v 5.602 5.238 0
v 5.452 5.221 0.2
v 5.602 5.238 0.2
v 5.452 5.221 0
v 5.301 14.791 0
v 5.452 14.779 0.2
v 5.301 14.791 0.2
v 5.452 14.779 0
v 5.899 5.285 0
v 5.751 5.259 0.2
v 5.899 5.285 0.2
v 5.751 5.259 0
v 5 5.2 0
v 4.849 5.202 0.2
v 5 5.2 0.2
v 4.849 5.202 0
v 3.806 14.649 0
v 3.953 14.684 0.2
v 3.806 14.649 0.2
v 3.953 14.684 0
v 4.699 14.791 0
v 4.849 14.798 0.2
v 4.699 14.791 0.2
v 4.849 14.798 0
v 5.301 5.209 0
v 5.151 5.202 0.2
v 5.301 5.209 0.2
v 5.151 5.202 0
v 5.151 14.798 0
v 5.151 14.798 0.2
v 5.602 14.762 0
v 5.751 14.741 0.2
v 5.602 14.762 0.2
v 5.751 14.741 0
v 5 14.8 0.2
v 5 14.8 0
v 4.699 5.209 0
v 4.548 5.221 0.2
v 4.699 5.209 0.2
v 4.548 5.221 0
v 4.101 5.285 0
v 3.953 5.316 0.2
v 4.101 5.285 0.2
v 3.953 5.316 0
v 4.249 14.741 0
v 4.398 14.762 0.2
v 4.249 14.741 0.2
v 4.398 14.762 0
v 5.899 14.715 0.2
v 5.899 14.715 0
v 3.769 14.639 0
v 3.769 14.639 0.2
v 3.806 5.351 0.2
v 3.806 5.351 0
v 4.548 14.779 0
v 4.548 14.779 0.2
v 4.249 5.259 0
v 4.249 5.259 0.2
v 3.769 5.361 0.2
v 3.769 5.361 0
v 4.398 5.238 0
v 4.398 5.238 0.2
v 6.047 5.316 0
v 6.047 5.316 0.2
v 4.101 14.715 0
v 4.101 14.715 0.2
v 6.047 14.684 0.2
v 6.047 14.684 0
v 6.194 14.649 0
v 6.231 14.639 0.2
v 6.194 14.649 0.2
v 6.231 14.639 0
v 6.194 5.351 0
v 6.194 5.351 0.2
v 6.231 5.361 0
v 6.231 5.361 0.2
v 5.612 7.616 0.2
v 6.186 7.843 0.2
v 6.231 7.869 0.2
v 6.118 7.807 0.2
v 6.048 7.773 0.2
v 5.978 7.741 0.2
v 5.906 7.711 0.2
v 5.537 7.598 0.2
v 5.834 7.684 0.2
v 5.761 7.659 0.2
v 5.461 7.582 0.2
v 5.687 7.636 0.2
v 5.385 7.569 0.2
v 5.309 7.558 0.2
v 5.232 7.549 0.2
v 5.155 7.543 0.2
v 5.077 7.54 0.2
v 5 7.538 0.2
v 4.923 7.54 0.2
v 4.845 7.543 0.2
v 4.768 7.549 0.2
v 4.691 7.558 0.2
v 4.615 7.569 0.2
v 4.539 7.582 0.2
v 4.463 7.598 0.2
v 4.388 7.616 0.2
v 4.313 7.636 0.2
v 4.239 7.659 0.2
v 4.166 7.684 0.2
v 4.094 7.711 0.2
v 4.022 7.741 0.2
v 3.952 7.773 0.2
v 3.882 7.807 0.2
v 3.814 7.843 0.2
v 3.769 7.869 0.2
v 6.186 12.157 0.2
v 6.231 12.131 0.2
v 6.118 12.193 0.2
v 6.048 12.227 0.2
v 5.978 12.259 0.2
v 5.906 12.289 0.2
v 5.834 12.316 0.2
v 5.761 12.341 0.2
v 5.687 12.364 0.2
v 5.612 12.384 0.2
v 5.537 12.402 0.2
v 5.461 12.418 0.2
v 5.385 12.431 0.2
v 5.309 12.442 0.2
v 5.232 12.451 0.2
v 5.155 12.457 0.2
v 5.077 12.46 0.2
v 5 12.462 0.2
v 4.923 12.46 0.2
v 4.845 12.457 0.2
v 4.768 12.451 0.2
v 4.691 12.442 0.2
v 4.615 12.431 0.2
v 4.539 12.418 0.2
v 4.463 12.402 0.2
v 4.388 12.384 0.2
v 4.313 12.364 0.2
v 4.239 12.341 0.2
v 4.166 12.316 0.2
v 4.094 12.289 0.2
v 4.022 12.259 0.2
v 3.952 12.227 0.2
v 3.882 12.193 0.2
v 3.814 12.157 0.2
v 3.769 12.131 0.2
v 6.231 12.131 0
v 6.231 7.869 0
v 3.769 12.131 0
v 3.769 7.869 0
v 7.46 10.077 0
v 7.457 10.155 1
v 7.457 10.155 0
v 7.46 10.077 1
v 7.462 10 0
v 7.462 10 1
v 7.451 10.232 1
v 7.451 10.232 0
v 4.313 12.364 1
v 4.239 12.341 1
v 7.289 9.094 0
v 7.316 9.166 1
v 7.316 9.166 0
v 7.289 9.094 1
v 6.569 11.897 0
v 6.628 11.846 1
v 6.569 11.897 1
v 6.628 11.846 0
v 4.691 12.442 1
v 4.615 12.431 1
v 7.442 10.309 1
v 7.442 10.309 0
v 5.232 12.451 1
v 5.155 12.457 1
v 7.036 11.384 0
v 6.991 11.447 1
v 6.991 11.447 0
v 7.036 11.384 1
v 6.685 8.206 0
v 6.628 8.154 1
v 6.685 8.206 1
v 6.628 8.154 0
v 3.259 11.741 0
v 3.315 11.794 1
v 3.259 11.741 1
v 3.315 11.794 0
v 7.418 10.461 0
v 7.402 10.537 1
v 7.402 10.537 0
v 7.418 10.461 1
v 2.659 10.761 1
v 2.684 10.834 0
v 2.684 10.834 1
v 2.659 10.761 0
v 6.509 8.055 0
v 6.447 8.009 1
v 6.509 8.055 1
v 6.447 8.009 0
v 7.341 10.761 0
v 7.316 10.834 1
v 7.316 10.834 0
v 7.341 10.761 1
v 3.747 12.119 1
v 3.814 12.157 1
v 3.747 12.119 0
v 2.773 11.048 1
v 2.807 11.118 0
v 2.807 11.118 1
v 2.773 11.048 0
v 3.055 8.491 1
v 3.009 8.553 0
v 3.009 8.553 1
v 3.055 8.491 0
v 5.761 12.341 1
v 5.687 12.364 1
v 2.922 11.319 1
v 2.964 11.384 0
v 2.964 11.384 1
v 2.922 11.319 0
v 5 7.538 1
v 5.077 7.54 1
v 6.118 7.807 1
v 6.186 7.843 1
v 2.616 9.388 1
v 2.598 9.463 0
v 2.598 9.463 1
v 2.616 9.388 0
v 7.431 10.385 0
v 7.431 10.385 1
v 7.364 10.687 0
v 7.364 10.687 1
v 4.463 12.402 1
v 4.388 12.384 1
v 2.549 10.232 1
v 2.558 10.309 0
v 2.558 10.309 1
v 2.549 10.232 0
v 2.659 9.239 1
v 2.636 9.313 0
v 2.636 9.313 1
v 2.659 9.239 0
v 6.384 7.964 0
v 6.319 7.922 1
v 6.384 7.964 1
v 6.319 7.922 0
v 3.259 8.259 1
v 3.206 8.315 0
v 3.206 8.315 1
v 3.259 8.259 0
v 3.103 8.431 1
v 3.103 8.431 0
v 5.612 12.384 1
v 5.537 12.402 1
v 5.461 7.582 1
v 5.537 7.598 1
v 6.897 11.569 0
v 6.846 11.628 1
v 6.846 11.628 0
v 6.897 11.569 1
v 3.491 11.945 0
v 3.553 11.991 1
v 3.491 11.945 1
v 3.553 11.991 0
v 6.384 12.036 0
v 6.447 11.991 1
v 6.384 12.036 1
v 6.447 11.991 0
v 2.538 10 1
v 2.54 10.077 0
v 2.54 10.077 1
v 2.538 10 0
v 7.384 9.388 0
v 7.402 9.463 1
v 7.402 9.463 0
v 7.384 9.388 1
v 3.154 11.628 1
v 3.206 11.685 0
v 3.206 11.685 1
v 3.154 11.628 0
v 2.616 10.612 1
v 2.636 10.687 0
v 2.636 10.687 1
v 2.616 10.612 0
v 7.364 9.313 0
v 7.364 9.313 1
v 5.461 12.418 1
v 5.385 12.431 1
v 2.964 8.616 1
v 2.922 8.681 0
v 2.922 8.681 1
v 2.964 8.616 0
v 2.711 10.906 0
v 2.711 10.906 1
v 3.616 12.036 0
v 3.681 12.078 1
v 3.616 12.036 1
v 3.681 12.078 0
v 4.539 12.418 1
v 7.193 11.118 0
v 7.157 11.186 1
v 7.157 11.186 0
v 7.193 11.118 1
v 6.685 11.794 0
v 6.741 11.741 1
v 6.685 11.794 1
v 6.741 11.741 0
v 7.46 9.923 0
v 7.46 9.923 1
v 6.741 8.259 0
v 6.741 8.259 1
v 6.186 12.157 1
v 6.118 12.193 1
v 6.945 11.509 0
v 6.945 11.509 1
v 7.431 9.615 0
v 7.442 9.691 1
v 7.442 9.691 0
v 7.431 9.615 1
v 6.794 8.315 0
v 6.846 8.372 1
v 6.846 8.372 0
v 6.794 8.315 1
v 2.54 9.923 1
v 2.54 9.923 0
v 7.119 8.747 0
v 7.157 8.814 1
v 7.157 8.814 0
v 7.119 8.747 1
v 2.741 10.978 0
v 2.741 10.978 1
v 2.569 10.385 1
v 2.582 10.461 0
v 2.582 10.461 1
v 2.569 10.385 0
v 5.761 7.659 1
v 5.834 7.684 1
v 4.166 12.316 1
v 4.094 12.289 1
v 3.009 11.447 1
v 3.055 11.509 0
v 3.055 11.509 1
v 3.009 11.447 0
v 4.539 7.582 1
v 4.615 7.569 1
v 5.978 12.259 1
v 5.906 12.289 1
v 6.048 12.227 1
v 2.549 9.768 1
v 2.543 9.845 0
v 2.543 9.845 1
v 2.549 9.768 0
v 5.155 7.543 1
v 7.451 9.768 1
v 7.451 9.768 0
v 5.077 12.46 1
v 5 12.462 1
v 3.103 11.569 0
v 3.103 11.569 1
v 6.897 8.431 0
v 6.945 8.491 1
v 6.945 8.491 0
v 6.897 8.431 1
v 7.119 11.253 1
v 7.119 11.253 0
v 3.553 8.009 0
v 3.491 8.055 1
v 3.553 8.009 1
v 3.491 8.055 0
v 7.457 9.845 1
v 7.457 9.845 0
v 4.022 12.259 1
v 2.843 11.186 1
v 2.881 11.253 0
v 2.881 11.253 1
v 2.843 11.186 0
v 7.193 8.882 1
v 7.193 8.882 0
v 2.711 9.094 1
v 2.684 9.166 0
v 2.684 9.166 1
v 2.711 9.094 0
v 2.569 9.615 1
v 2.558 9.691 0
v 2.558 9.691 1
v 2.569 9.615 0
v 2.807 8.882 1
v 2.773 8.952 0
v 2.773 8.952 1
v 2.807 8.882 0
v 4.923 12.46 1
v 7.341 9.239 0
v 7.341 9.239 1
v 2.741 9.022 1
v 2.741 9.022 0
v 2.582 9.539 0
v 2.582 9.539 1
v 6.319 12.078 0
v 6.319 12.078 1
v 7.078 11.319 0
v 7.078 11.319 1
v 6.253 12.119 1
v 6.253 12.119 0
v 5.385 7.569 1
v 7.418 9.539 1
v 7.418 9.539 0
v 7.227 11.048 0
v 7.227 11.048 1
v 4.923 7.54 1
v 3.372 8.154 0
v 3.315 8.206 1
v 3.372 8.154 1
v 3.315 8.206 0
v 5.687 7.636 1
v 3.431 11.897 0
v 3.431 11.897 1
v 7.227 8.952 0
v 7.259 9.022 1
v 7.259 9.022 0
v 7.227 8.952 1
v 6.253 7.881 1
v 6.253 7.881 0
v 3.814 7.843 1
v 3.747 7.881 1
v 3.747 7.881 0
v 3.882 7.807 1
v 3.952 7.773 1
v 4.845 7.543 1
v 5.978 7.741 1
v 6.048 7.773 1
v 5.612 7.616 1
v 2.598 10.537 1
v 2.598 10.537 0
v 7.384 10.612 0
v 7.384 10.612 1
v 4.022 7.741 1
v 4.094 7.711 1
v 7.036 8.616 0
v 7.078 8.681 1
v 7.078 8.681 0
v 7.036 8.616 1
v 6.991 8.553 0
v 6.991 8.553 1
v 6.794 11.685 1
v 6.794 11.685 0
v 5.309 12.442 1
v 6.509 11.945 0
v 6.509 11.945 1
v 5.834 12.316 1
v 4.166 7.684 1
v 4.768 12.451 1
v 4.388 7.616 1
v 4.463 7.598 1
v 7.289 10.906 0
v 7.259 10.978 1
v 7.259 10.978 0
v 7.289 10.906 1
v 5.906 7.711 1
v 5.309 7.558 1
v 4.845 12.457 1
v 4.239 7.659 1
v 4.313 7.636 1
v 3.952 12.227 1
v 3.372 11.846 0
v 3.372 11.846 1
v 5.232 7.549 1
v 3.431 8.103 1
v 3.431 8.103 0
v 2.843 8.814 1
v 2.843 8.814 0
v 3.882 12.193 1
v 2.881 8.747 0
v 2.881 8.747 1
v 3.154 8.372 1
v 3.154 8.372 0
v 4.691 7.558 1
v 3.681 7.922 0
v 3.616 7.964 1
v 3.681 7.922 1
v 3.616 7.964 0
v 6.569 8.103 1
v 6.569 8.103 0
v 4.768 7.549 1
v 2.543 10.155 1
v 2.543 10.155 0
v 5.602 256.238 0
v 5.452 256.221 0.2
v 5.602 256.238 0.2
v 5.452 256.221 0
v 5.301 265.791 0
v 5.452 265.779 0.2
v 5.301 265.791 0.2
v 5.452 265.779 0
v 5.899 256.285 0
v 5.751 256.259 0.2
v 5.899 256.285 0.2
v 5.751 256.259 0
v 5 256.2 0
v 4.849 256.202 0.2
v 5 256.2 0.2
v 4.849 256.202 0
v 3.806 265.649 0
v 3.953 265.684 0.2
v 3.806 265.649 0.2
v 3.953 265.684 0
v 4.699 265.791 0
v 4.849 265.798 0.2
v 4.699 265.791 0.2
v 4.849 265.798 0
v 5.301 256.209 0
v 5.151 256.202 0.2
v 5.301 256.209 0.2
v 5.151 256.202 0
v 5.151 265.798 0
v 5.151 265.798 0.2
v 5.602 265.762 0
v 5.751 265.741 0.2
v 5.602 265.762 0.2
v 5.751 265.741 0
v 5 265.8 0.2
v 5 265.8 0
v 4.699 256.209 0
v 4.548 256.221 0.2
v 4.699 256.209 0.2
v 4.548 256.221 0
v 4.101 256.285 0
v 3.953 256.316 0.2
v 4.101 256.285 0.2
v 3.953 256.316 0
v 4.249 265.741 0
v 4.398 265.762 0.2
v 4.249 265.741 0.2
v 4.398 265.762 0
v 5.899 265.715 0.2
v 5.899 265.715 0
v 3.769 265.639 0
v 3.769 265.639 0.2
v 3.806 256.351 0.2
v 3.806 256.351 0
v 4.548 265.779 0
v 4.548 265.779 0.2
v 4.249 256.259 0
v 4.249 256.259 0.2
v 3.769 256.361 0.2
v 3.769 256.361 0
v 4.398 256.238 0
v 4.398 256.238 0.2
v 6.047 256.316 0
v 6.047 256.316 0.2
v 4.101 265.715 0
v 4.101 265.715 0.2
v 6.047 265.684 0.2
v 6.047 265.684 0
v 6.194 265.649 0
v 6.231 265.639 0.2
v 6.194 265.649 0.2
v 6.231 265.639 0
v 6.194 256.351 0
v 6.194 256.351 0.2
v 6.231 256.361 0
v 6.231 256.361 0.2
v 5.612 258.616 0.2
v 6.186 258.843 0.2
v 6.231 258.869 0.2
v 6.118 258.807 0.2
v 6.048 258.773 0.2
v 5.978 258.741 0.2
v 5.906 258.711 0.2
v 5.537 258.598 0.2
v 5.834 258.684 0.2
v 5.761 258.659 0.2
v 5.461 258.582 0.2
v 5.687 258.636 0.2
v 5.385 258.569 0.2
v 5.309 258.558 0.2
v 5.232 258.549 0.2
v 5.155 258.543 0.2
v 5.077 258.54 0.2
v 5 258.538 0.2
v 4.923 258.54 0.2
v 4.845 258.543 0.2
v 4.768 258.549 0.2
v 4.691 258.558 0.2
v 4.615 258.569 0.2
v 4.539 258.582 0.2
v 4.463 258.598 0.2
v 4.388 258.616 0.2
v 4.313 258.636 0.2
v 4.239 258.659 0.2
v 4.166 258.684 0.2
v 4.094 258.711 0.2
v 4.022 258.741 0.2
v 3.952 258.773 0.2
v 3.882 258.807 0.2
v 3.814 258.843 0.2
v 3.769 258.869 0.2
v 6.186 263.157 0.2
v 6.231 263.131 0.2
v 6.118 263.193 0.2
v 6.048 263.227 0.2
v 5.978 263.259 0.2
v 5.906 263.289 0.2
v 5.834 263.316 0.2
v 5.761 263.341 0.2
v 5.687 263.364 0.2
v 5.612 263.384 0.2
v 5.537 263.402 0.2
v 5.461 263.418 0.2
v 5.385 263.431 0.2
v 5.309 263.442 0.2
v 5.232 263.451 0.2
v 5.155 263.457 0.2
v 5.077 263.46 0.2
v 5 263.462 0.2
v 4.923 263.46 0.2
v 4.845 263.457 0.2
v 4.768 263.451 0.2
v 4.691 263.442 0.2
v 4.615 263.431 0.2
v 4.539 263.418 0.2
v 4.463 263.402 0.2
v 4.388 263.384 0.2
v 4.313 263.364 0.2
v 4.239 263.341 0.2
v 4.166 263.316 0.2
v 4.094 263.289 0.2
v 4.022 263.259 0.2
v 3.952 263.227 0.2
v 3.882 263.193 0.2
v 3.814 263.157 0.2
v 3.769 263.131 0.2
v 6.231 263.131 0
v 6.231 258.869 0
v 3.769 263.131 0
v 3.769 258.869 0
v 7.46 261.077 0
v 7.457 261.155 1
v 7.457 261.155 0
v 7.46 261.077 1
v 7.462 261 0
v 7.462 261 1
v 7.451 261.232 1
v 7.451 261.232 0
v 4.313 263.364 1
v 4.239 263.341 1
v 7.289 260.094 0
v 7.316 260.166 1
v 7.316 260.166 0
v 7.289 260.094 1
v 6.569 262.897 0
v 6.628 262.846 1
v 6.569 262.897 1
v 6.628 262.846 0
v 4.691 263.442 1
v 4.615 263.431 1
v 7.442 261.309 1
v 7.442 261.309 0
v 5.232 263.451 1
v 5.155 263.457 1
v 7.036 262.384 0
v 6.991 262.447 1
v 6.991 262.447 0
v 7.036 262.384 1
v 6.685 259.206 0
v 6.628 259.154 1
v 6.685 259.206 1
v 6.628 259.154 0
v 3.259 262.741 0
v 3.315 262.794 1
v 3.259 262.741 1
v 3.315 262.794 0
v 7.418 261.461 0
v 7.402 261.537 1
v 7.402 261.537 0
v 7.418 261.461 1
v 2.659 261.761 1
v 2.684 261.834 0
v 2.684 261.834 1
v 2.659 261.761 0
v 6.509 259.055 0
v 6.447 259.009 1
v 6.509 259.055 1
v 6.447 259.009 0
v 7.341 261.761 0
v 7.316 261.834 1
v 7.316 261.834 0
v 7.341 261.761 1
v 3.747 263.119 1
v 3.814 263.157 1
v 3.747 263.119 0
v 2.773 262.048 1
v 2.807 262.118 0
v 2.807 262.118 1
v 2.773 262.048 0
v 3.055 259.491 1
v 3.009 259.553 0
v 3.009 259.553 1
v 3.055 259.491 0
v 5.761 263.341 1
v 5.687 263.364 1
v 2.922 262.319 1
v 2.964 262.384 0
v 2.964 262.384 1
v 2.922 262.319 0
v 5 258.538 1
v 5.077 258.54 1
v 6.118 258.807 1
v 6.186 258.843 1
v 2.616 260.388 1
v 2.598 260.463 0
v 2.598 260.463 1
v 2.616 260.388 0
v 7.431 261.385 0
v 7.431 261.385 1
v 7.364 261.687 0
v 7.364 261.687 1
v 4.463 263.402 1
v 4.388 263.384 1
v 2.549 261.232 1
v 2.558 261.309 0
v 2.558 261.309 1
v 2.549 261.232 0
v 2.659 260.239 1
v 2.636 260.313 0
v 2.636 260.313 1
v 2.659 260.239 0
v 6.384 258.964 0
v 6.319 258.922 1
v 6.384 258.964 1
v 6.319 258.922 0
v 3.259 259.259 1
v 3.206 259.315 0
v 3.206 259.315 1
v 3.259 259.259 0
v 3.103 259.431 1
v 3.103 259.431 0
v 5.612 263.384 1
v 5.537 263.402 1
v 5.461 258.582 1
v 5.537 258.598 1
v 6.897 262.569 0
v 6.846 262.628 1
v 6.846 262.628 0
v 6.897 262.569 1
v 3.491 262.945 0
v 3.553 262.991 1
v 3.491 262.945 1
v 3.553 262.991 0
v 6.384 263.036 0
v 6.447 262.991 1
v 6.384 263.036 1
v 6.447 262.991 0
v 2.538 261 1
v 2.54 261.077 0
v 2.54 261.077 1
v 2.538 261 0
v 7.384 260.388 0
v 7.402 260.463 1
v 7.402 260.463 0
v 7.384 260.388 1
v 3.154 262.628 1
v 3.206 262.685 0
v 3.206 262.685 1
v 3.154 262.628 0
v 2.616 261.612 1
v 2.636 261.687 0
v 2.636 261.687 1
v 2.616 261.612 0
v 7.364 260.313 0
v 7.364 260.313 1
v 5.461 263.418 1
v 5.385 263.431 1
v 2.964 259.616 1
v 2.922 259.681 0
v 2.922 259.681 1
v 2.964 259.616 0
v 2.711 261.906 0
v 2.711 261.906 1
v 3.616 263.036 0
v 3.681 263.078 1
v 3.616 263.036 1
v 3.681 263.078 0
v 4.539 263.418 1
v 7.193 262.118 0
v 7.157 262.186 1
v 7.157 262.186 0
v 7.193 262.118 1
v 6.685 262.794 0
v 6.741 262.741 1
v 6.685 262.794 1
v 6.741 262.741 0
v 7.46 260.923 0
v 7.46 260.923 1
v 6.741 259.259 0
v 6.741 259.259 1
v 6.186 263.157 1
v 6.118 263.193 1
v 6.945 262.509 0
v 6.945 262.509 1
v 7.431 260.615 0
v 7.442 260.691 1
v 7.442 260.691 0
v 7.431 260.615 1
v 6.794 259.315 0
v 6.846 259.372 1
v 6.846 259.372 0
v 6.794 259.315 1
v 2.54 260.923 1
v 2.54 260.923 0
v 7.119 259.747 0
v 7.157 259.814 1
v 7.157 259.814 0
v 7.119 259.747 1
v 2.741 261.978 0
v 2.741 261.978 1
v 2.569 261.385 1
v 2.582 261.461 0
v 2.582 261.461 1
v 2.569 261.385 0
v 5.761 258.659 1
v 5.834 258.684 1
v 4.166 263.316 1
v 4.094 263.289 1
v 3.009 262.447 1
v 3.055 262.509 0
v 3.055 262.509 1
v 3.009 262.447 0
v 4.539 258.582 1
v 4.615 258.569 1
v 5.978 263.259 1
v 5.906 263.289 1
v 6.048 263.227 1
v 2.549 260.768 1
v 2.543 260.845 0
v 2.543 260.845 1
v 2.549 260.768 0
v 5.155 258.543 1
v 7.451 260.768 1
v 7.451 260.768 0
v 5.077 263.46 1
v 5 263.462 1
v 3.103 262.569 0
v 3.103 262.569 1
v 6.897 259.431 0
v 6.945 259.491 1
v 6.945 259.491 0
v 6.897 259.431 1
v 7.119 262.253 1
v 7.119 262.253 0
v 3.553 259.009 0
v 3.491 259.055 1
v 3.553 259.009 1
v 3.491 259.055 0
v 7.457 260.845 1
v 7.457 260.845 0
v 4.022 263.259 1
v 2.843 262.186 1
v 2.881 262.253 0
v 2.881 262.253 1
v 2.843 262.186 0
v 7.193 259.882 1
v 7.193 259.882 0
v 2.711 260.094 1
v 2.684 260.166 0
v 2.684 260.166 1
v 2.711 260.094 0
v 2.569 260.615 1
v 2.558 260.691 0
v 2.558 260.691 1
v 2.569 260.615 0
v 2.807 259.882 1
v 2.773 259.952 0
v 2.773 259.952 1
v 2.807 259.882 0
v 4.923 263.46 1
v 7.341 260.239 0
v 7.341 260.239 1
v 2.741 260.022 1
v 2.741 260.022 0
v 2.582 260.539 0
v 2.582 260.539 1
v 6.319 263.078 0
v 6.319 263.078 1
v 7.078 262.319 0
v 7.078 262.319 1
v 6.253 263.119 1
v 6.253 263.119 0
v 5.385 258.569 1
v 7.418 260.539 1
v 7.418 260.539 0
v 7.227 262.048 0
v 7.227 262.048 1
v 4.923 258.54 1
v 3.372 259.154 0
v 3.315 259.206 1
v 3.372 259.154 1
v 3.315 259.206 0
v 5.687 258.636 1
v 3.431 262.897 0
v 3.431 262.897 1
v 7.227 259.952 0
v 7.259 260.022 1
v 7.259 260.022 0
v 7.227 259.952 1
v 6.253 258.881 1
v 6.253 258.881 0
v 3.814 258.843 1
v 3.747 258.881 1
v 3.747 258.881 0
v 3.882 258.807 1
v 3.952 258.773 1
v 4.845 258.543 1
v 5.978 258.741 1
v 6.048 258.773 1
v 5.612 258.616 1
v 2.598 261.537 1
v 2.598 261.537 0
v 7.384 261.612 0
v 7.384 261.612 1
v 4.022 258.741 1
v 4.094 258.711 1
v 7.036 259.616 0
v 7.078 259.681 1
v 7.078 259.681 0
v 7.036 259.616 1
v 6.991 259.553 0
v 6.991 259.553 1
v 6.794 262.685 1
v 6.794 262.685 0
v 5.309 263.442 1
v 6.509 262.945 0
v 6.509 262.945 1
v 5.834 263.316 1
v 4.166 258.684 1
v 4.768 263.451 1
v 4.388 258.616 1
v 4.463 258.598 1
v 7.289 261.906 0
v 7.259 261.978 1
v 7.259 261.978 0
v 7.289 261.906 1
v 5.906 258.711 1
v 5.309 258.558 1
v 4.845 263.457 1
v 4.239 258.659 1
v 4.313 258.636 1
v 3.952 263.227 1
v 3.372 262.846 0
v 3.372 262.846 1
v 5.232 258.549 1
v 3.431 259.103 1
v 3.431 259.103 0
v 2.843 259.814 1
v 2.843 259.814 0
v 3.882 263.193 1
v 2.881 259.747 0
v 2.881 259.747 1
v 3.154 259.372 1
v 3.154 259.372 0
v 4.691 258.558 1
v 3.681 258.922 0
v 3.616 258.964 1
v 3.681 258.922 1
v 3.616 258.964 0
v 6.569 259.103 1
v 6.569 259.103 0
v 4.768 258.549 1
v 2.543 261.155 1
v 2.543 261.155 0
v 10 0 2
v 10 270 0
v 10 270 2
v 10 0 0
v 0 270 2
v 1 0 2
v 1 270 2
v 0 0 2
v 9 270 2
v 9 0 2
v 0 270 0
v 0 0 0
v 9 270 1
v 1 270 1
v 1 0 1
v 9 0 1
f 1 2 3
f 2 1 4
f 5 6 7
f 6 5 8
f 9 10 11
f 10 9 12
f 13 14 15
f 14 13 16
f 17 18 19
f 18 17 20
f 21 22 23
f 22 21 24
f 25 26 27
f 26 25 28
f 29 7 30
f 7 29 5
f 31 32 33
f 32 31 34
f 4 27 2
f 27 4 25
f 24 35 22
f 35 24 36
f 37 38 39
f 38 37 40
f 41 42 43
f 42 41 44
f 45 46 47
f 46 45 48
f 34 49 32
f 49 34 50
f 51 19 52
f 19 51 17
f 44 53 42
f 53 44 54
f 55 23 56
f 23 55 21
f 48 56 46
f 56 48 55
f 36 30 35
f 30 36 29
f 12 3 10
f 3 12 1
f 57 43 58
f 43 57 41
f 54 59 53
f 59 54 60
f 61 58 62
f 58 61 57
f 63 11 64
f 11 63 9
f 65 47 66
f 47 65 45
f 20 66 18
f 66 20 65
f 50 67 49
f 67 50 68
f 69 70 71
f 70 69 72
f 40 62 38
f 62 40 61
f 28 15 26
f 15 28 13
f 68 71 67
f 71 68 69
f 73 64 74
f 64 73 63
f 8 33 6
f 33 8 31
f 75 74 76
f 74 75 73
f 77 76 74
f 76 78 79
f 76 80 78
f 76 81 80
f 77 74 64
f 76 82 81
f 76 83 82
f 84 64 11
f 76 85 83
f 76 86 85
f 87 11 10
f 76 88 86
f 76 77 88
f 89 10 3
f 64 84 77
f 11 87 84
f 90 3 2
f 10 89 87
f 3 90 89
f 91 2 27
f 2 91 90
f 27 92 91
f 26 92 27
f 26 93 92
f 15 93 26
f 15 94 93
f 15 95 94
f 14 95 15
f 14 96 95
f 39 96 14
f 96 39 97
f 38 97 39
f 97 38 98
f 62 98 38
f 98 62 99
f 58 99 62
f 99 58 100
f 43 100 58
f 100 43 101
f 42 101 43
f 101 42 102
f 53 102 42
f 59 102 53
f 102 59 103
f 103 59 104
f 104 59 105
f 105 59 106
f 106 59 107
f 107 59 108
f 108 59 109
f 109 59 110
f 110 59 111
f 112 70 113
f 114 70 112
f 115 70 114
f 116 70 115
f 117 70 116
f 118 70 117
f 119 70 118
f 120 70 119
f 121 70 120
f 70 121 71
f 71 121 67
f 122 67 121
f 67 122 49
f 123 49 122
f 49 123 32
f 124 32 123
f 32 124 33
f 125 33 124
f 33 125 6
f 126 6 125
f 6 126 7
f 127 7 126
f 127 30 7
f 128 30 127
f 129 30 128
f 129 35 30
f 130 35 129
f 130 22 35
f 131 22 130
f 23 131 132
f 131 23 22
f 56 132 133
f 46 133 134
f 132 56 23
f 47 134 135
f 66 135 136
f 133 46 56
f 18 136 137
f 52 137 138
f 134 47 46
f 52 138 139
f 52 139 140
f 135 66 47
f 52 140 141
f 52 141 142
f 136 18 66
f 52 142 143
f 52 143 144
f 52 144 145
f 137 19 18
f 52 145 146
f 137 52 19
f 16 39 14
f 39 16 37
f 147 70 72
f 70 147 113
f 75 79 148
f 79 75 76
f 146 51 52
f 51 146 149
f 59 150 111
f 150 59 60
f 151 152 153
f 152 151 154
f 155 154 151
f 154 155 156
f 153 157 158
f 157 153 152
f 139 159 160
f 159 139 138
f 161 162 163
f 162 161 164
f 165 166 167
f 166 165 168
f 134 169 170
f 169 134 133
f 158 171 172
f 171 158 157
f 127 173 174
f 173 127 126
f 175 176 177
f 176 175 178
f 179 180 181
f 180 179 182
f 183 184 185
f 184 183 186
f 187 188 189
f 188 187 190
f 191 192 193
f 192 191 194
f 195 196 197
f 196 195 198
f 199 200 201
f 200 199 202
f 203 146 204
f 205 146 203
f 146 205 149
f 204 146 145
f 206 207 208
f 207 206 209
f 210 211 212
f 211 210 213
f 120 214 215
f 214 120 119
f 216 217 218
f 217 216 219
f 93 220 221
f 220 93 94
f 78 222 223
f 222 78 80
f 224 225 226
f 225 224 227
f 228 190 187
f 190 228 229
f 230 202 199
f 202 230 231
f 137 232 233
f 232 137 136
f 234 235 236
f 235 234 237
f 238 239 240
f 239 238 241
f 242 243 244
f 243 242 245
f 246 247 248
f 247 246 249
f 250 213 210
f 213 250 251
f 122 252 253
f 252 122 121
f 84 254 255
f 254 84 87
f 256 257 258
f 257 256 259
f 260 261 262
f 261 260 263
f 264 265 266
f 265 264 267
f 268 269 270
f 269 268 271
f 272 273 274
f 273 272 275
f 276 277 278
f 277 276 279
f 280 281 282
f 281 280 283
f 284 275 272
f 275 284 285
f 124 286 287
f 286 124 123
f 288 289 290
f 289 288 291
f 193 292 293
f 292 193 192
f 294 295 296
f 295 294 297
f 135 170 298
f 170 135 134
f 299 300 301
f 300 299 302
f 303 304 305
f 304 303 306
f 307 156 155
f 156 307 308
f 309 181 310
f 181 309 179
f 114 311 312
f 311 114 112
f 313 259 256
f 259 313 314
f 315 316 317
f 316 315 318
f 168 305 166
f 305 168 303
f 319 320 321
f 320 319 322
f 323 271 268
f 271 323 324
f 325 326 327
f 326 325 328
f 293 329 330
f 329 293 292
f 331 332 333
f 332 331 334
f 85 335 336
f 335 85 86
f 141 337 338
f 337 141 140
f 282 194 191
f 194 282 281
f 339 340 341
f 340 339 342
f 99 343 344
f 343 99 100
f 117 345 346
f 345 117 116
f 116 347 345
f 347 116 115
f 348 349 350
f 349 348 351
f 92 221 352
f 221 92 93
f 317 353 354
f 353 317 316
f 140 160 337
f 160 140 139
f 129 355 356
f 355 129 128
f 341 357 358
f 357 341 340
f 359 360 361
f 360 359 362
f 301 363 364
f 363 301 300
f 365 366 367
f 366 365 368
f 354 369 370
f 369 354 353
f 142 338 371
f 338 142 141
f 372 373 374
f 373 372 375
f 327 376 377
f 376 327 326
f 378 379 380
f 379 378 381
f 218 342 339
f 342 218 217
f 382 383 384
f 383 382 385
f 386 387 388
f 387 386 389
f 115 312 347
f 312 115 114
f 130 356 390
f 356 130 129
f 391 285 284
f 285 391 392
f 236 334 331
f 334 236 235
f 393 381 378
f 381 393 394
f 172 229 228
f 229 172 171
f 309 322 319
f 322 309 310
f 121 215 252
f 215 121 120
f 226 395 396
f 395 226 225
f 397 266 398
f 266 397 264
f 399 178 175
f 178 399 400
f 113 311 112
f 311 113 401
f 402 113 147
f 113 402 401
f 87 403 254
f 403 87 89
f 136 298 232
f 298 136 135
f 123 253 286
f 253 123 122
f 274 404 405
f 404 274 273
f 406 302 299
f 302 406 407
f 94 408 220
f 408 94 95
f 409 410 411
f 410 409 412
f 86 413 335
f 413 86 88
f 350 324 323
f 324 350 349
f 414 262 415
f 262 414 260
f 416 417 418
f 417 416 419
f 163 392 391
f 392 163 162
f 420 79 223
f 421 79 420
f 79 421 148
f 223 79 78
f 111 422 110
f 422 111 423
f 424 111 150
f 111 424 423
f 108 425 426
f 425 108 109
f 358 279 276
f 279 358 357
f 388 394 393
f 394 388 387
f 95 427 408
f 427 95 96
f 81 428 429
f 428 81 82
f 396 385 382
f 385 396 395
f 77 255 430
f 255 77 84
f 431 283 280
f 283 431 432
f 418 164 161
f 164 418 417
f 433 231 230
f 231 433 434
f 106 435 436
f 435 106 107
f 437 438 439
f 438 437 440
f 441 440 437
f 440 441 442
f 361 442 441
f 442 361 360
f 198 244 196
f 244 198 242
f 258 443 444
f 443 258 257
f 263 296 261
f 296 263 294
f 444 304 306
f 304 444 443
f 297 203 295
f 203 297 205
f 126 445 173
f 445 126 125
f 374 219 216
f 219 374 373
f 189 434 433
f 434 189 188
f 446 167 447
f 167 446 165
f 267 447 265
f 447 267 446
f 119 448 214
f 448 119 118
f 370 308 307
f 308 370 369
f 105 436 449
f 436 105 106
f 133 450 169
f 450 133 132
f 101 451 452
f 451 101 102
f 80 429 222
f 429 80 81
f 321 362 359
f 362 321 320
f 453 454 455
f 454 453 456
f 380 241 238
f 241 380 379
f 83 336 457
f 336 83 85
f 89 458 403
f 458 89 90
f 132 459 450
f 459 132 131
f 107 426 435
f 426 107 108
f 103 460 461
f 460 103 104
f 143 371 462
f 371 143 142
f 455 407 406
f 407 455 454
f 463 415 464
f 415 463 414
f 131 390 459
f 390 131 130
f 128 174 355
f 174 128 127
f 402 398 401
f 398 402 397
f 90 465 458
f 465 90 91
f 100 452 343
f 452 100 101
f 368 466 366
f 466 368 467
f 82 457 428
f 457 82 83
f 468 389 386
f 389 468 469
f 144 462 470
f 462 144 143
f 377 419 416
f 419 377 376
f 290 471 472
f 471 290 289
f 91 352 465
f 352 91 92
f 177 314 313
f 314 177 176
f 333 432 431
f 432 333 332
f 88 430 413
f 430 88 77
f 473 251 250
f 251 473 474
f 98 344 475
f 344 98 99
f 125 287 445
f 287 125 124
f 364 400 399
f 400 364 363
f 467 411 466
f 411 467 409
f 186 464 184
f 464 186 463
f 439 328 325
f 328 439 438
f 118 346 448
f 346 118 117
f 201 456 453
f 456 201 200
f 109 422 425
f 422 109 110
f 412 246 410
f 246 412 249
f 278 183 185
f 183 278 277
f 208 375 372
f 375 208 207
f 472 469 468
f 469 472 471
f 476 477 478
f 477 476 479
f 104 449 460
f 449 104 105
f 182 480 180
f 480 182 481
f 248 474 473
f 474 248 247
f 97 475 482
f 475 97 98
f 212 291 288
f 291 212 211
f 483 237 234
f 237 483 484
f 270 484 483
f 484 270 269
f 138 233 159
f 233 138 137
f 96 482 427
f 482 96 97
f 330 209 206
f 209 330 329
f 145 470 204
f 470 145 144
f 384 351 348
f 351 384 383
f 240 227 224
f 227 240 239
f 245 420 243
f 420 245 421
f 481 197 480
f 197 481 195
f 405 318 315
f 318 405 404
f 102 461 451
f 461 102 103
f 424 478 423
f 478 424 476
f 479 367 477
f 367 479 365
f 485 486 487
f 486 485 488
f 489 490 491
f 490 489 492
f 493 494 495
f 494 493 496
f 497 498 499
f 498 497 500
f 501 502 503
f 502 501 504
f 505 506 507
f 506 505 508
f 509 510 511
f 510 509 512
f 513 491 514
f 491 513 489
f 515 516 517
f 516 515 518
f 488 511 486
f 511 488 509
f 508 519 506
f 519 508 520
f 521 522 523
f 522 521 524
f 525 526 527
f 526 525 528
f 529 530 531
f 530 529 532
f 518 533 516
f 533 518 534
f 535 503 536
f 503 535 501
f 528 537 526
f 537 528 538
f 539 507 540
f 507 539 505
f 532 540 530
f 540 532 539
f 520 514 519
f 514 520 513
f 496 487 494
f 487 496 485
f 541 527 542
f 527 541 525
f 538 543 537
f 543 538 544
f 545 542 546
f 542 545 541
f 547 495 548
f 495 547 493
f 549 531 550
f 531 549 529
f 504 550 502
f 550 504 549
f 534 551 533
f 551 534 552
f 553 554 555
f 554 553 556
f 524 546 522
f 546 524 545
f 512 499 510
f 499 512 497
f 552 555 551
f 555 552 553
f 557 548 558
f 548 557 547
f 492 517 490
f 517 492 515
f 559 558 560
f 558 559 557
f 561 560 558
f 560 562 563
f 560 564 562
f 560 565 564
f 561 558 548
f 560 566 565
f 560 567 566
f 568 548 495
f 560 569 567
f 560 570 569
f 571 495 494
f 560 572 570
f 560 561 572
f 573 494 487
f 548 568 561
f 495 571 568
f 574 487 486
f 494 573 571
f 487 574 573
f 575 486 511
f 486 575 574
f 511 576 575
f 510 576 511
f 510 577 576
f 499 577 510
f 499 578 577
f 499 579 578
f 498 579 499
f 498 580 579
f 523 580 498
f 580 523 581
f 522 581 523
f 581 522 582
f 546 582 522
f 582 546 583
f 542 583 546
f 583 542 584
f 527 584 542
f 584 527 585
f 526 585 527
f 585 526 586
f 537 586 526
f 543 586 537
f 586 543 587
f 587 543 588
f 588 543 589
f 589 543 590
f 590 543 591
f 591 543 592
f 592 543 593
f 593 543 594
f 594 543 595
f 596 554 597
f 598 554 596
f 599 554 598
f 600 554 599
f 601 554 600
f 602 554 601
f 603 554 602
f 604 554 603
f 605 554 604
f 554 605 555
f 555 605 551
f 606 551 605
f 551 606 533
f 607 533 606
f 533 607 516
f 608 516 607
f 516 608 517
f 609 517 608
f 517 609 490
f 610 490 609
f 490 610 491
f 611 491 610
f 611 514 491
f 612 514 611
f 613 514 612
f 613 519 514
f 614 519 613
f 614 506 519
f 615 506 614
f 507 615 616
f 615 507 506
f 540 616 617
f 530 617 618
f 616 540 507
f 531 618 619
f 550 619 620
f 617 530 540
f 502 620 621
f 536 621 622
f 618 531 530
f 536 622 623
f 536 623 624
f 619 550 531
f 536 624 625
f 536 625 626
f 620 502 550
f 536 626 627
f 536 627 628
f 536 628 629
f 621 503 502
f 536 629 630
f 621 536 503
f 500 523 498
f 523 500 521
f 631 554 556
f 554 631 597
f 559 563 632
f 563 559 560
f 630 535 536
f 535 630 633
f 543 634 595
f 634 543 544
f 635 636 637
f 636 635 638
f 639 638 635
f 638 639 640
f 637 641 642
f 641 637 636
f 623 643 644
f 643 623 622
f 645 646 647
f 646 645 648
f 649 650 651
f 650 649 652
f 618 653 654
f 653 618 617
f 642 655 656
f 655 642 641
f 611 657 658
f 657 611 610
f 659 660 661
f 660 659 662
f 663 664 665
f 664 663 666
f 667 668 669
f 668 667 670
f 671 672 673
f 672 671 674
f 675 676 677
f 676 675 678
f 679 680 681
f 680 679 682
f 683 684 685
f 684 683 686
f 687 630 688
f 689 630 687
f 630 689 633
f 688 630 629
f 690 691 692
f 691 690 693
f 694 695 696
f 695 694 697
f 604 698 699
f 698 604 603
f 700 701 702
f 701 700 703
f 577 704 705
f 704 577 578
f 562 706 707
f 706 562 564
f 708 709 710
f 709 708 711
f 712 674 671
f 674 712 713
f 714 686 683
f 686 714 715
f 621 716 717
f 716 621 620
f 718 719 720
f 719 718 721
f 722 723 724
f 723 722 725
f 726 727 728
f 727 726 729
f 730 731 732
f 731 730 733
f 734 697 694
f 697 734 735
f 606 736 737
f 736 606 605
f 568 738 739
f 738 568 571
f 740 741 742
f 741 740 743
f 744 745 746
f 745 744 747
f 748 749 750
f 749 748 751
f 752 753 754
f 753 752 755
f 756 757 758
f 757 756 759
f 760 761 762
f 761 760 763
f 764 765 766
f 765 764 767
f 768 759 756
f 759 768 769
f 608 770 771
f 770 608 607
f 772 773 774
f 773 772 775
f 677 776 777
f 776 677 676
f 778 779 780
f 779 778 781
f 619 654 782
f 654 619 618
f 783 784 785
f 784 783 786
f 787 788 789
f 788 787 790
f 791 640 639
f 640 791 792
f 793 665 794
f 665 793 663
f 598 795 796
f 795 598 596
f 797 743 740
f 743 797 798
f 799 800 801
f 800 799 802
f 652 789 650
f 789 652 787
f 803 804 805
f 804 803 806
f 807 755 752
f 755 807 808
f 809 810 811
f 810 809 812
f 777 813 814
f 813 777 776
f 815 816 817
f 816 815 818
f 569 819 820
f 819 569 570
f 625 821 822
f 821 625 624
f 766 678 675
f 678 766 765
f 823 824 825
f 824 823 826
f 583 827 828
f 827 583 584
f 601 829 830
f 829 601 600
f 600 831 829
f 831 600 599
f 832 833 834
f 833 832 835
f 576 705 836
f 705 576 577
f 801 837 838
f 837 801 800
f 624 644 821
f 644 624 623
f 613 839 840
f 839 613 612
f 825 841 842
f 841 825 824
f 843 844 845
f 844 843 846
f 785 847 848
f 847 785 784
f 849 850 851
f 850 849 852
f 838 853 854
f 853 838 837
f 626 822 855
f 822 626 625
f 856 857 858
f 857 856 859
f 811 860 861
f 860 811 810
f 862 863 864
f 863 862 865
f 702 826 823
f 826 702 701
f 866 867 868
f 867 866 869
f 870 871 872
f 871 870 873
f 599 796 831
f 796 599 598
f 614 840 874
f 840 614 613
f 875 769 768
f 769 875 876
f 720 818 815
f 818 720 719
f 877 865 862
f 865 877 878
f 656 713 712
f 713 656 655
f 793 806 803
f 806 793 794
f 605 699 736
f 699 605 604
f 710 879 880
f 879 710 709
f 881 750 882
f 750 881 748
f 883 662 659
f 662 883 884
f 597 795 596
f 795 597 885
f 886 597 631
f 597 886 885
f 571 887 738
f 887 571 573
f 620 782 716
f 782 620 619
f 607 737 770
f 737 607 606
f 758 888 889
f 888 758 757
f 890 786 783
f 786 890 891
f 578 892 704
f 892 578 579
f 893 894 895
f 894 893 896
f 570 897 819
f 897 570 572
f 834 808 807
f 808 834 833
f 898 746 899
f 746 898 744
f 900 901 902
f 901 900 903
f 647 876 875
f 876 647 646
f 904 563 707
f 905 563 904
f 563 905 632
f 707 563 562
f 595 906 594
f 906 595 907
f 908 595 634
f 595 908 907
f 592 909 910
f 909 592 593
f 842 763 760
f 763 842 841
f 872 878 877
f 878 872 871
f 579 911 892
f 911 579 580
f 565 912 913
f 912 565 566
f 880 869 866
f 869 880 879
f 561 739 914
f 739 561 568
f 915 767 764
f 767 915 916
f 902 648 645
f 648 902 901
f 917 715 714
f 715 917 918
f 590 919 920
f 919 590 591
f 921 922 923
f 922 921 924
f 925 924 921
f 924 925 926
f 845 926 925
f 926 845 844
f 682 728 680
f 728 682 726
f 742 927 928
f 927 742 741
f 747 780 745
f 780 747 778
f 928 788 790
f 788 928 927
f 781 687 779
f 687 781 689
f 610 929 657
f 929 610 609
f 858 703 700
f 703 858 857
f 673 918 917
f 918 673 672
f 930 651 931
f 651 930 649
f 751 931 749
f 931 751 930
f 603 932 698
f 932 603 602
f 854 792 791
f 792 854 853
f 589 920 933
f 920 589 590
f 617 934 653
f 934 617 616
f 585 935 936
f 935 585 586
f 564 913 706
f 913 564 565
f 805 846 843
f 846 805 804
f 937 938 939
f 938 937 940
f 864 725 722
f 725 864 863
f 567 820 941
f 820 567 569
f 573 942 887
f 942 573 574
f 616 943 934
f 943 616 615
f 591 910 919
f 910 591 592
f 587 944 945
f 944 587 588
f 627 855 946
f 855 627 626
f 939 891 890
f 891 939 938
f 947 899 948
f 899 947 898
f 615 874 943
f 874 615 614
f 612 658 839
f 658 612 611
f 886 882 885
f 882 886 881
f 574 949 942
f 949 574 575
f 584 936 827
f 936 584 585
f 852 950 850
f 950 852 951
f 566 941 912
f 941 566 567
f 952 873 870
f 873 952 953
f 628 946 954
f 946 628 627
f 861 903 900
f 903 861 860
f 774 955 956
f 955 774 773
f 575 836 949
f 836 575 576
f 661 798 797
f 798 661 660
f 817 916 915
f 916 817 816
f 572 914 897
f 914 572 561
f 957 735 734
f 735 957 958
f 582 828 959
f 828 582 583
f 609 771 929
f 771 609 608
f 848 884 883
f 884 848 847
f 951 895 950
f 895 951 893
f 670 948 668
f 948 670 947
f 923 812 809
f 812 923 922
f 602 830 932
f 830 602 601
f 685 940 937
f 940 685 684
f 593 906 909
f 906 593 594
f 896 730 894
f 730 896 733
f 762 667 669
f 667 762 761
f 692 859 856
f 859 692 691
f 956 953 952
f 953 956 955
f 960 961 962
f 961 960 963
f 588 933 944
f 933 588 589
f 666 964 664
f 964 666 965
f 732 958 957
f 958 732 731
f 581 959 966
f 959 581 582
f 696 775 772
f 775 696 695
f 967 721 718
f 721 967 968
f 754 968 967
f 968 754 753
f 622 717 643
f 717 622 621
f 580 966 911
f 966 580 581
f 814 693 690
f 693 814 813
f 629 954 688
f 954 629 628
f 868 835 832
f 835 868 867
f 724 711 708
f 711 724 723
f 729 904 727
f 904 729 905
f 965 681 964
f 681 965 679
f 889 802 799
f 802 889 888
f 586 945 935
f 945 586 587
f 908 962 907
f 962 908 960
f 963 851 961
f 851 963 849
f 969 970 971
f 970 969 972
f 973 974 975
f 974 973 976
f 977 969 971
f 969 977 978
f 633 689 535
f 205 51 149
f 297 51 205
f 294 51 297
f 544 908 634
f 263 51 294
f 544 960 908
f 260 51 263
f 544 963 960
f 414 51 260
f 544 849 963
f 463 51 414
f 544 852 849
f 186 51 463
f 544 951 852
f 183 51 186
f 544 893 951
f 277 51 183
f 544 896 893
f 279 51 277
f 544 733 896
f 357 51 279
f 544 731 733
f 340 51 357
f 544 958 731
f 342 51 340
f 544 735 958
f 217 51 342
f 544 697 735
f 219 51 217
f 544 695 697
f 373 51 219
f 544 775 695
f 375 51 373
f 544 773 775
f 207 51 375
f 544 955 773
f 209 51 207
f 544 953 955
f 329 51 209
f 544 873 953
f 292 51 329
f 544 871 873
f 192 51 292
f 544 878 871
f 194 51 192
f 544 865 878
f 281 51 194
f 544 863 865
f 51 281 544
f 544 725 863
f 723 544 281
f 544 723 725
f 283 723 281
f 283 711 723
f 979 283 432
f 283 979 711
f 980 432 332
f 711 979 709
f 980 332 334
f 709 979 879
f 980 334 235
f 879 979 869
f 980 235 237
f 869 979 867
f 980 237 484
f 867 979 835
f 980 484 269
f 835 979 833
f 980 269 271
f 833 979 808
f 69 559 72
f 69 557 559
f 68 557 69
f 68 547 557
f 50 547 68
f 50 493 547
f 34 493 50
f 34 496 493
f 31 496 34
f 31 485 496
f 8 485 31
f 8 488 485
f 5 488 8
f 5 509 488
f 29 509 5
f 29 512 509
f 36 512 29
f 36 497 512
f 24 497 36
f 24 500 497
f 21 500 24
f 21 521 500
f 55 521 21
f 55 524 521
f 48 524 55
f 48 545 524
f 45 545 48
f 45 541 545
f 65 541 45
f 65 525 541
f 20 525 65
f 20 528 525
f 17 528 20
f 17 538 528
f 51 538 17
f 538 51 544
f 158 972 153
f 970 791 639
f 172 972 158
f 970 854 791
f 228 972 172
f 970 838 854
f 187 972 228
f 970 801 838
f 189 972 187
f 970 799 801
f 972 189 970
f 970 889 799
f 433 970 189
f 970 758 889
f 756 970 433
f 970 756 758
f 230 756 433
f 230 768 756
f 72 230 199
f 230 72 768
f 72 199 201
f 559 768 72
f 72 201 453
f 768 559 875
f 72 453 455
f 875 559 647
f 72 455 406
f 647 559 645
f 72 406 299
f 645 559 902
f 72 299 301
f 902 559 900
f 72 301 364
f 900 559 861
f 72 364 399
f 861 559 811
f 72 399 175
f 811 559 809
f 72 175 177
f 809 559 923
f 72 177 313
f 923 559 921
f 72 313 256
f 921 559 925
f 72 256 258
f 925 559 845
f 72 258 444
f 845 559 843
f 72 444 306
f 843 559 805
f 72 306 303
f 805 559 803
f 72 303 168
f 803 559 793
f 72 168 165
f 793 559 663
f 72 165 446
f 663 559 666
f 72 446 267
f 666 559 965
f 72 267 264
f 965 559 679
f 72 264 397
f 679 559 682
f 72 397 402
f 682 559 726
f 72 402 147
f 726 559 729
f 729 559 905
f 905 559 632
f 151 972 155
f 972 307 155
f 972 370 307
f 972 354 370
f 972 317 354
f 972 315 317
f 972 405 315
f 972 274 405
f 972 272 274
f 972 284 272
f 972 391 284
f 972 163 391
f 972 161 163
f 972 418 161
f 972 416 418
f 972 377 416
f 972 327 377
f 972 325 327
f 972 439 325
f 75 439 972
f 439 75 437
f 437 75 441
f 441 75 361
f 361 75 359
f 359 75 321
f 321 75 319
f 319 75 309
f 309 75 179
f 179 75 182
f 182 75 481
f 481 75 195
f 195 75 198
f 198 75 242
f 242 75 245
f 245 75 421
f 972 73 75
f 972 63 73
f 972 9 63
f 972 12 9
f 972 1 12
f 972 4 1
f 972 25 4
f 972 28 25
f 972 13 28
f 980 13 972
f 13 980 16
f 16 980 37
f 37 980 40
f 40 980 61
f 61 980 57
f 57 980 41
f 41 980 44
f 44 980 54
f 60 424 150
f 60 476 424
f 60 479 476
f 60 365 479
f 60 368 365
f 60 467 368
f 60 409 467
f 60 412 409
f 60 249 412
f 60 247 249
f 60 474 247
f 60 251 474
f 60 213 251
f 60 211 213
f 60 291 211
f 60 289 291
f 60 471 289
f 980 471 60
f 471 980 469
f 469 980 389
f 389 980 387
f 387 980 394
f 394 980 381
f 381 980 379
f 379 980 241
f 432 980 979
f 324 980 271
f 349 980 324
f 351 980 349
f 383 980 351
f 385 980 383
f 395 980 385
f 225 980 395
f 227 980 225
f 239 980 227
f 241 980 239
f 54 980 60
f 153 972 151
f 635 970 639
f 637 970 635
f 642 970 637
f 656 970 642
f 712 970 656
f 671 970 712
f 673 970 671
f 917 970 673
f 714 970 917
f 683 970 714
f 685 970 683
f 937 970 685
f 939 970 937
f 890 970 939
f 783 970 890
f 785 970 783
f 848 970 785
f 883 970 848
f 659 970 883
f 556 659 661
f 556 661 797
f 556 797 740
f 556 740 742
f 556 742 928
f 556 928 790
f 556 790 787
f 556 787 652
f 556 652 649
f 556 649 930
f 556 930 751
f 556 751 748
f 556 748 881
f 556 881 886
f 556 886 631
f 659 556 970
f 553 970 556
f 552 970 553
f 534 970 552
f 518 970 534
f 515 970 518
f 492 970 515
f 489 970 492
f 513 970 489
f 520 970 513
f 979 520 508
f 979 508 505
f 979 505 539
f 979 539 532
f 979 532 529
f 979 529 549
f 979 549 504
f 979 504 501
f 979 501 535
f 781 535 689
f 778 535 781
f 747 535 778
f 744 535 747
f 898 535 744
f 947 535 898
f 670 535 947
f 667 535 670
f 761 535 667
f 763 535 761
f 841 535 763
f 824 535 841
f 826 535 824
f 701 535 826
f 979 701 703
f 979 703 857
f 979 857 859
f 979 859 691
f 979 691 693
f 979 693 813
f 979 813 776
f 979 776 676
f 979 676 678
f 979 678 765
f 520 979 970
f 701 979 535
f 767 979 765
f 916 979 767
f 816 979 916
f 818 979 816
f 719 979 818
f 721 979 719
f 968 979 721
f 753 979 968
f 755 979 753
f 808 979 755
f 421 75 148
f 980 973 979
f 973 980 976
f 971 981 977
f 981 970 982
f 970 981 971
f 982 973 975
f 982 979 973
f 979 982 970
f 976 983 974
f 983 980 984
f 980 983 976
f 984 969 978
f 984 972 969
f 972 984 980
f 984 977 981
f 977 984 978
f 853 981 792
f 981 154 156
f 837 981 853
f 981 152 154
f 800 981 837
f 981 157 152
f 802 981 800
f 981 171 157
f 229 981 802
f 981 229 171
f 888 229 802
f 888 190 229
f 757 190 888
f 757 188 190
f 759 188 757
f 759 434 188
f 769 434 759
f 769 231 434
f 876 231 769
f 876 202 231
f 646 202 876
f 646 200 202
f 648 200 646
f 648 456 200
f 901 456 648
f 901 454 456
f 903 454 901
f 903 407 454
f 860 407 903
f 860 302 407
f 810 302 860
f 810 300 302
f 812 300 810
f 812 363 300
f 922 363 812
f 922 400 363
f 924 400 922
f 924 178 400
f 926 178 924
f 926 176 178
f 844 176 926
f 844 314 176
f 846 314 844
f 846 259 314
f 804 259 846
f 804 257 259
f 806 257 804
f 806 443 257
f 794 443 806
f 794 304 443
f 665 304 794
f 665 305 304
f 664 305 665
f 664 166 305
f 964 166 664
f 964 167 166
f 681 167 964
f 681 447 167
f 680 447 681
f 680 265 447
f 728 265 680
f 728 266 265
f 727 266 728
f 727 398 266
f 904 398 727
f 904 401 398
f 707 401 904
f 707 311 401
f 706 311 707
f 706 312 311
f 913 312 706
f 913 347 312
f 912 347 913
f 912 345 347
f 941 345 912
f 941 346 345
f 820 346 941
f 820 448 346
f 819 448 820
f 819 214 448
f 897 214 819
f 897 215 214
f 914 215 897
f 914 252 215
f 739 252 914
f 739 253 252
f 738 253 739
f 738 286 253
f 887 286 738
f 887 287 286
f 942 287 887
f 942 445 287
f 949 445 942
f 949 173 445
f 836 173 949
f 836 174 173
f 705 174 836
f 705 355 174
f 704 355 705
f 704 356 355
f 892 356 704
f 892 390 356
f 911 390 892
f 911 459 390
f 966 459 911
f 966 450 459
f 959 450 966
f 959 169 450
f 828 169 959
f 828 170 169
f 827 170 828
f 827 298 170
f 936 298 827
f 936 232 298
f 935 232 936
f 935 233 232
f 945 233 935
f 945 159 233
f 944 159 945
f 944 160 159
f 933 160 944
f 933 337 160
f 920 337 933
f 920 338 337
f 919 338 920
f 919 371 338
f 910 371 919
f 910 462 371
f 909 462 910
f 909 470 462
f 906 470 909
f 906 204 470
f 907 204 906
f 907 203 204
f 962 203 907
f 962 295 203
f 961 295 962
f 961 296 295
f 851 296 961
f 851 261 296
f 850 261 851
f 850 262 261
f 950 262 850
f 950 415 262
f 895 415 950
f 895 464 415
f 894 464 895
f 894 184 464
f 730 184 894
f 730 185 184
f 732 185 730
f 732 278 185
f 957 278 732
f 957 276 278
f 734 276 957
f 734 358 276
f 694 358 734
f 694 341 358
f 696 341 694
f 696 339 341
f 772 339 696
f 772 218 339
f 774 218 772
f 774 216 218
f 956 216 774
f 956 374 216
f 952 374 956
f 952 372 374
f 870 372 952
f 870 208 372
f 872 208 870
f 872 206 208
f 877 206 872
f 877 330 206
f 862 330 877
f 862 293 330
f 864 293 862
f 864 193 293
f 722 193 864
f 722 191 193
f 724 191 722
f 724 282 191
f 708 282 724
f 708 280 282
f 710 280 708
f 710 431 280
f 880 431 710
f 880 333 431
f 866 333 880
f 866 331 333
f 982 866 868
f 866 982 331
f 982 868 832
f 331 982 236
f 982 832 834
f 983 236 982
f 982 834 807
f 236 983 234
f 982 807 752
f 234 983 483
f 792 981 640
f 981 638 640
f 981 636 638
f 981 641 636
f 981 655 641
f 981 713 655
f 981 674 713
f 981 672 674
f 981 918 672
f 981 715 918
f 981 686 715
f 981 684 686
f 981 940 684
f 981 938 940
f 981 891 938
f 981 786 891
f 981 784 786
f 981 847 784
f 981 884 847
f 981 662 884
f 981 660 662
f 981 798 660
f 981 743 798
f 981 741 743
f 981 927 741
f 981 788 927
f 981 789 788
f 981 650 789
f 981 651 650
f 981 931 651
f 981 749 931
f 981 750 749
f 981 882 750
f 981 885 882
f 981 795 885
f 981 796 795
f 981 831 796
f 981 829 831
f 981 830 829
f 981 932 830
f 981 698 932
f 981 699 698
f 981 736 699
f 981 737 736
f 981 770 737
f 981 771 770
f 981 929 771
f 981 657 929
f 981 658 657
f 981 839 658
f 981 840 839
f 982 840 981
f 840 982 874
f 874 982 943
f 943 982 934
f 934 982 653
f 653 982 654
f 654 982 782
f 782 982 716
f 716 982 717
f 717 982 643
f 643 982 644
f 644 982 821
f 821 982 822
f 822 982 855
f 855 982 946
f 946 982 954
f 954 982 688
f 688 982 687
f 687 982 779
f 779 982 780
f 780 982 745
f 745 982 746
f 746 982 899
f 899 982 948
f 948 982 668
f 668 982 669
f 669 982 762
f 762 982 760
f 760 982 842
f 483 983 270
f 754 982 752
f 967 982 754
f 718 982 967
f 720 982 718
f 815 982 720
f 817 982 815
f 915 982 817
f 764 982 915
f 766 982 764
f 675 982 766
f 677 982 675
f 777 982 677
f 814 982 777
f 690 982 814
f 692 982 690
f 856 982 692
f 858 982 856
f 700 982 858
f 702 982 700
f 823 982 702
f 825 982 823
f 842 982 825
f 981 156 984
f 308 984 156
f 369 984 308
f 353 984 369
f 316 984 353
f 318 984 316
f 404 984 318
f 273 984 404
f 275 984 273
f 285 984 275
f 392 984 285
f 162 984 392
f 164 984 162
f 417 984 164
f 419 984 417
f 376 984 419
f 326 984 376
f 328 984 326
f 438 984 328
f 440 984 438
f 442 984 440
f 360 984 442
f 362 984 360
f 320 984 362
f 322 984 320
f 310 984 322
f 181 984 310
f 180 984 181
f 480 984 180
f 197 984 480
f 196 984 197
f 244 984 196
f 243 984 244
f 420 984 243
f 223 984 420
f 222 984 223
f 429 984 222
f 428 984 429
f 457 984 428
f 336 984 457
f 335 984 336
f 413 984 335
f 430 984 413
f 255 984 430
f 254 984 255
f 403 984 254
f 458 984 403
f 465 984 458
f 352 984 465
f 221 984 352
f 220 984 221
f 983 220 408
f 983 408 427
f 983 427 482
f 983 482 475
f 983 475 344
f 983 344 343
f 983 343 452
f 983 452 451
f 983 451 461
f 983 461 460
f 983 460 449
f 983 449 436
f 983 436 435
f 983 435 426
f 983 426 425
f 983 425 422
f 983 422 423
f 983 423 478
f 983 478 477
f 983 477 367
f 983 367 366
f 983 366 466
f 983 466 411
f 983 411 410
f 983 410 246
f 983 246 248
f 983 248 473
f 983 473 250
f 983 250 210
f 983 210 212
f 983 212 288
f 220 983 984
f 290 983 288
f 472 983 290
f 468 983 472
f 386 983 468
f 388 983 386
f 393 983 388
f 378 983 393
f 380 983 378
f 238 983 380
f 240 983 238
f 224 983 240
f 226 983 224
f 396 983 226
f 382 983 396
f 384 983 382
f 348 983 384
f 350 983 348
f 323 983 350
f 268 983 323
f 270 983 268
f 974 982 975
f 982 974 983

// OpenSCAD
// file: clamp/clamp_v1.scad
// simple scooter clamp:

// v0: 33mm inner (hollow) diameter
tieHeight = 6;
tieWidth = 3; 

module tieHole(inner, outter, height) {
  translate([0,0,(2*height/3)-(tieHeight/2)]) {
    difference() {
      cylinder(h=tieHeight, r=outter-((outter-inner)/2)+(tieWidth/2), center=false, $fn=200); 
      translate([0,0,-0.1]) {
        cylinder(h=tieHeight+0.2, r=inner+((outter-inner)/2)-(tieWidth/2), center=false, $fn=200); 
      }
    }
  }
}
module clamp (inner, outter, height, degree) {
   
   translate([0,0,0]) {
    difference() {
      cylinder(h=height, r=outter, center=false, $fn=200); 

      // cut out middle
      translate([0,0,-0.1]) {
        cylinder(h=height+0.2, r=inner, center=false, $fn=200); 
      }

      // Cut a Hole for the zip ties
      tieHole(inner, outter, height);

      // Remove half of the circly
      translate([-outter-0.1,-0.1,-0.1]) {
        cube(size=[2*outter+0.2, 2*outter, height+0.2], center=false);
      }

      // remove certain degree of the rest
      // -- Magic math does remove more of the 180deg that were left
      rotate([0,0,180-degree]) {

        translate([-outter-0.1,-0.1,-0.1]) {
          cube(size=[2*outter+0.2, 2*outter, height+0.2], center=false);
        }
      }

    }
   }
 }
//clamp(33/2, 43/2, 20, 60);
// file: clamp/connector_v1.scad
include <./clamp_v1.scad>



 

module inserter(scale) { 

  holeHeight=scale/3;
  holeDiameter=scale/1.3;

  // -- insertion wings
  // inserter
  translate([0, 0, 1.5*holeHeight]) {
    // pinhole
    cylinder(h=scale+2*holeHeight, r=holeDiameter, center=false, $fn=200);  
    difference() {
      cylinder(h=scale/2, r=1.5*scale, center=false, $fn=200);

      translate([holeDiameter/2, -1.5*scale, -0.1]) {
        cube(size=[3*scale, 3*scale, 3*scale], center=false);
      }

      translate([-3*scale-holeDiameter/2, -1.5*scale, -0.1]) {
        cube(size=[3*scale, 3*scale, 3*scale], center=false);
      }
    } 
  }
}





module cf(scale, rotate, outwards) {

  holeHeight=scale/3;
  holeDiameter=scale/1.3;
  r=90 - rotate/2;

  translate([sin(r)*(outwards-scale), -cos(r)*(outwards-scale), 0]){ // magic math: rotate the hole matching to the clamp.
    // it moves to the middle of the radial part of the clamp
    rotate([90,0,r]) {


      // opening for the inserter. scaled to cut a "long" enough
      translate([0,0,-3*holeHeight]) {
        scale([1,1,2]) {
          inserter(scale); 
        }
        
      }

      difference() {

        // rotation-hole fullwing
        translate([0,0,0]) {
          cylinder(h=scale/2, r=1.5*scale, center=false, $fn=200);
        }

        // remove wing
        translate([holeDiameter/2,holeDiameter/2,-0.1]) { 
          cube(size=[2*scale, 2*scale, scale+0.2], center=false);
        }

        // remove wing
        translate([-holeDiameter/2,-holeDiameter/2,-0.1]) {
          rotate([0,0,180]) {
            cube(size=[2*scale, 2*scale, scale+0.2], center=false);
          }
        }
        

        // arreting nipples

        translate([-1.5*scale-0.7,0.8,-0.1]) {
          cylinder(h=scale/2+0.2, r=1, center=false, $fn=200);
        }
        translate([1.5*scale+0.7,-0.8,-0.1]) {
          cylinder(h=scale/2+0.2, r=1, center=false, $fn=200);
        }

      }


    } 
  }

}


module connector_fem(scale, inner, outter, height, degree) {
  difference() {
    clamp(inner, outter, height, degree);
    translate([0,0,2*scale]){
      cf(scale, degree, outter); 
    }
    
  }
}

module connector_mal(scale) {
  scale([0.94, 0.94, 0.94]){
    inserter(scale);
  }
}
// main file
// -- LED stripe
include <./clamp/connector_v1.scad>

chunkLen=270;
stripWidth=8;

module stripe() {
  
  difference() {
    cube(size=[stripWidth+2, chunkLen, 2], center=false);
    translate([1, -0.1, 1]) {
      cube(size=[stripWidth, chunkLen+0.2, 2], center=false);
    }
    translate([(stripWidth+2)/2, 10, -3]) {
      inserter(3.2);
    }
    translate([(stripWidth+2)/2, chunkLen-10+1, -3]) {
      inserter(3.2);
    }
  }
}


stripe();
